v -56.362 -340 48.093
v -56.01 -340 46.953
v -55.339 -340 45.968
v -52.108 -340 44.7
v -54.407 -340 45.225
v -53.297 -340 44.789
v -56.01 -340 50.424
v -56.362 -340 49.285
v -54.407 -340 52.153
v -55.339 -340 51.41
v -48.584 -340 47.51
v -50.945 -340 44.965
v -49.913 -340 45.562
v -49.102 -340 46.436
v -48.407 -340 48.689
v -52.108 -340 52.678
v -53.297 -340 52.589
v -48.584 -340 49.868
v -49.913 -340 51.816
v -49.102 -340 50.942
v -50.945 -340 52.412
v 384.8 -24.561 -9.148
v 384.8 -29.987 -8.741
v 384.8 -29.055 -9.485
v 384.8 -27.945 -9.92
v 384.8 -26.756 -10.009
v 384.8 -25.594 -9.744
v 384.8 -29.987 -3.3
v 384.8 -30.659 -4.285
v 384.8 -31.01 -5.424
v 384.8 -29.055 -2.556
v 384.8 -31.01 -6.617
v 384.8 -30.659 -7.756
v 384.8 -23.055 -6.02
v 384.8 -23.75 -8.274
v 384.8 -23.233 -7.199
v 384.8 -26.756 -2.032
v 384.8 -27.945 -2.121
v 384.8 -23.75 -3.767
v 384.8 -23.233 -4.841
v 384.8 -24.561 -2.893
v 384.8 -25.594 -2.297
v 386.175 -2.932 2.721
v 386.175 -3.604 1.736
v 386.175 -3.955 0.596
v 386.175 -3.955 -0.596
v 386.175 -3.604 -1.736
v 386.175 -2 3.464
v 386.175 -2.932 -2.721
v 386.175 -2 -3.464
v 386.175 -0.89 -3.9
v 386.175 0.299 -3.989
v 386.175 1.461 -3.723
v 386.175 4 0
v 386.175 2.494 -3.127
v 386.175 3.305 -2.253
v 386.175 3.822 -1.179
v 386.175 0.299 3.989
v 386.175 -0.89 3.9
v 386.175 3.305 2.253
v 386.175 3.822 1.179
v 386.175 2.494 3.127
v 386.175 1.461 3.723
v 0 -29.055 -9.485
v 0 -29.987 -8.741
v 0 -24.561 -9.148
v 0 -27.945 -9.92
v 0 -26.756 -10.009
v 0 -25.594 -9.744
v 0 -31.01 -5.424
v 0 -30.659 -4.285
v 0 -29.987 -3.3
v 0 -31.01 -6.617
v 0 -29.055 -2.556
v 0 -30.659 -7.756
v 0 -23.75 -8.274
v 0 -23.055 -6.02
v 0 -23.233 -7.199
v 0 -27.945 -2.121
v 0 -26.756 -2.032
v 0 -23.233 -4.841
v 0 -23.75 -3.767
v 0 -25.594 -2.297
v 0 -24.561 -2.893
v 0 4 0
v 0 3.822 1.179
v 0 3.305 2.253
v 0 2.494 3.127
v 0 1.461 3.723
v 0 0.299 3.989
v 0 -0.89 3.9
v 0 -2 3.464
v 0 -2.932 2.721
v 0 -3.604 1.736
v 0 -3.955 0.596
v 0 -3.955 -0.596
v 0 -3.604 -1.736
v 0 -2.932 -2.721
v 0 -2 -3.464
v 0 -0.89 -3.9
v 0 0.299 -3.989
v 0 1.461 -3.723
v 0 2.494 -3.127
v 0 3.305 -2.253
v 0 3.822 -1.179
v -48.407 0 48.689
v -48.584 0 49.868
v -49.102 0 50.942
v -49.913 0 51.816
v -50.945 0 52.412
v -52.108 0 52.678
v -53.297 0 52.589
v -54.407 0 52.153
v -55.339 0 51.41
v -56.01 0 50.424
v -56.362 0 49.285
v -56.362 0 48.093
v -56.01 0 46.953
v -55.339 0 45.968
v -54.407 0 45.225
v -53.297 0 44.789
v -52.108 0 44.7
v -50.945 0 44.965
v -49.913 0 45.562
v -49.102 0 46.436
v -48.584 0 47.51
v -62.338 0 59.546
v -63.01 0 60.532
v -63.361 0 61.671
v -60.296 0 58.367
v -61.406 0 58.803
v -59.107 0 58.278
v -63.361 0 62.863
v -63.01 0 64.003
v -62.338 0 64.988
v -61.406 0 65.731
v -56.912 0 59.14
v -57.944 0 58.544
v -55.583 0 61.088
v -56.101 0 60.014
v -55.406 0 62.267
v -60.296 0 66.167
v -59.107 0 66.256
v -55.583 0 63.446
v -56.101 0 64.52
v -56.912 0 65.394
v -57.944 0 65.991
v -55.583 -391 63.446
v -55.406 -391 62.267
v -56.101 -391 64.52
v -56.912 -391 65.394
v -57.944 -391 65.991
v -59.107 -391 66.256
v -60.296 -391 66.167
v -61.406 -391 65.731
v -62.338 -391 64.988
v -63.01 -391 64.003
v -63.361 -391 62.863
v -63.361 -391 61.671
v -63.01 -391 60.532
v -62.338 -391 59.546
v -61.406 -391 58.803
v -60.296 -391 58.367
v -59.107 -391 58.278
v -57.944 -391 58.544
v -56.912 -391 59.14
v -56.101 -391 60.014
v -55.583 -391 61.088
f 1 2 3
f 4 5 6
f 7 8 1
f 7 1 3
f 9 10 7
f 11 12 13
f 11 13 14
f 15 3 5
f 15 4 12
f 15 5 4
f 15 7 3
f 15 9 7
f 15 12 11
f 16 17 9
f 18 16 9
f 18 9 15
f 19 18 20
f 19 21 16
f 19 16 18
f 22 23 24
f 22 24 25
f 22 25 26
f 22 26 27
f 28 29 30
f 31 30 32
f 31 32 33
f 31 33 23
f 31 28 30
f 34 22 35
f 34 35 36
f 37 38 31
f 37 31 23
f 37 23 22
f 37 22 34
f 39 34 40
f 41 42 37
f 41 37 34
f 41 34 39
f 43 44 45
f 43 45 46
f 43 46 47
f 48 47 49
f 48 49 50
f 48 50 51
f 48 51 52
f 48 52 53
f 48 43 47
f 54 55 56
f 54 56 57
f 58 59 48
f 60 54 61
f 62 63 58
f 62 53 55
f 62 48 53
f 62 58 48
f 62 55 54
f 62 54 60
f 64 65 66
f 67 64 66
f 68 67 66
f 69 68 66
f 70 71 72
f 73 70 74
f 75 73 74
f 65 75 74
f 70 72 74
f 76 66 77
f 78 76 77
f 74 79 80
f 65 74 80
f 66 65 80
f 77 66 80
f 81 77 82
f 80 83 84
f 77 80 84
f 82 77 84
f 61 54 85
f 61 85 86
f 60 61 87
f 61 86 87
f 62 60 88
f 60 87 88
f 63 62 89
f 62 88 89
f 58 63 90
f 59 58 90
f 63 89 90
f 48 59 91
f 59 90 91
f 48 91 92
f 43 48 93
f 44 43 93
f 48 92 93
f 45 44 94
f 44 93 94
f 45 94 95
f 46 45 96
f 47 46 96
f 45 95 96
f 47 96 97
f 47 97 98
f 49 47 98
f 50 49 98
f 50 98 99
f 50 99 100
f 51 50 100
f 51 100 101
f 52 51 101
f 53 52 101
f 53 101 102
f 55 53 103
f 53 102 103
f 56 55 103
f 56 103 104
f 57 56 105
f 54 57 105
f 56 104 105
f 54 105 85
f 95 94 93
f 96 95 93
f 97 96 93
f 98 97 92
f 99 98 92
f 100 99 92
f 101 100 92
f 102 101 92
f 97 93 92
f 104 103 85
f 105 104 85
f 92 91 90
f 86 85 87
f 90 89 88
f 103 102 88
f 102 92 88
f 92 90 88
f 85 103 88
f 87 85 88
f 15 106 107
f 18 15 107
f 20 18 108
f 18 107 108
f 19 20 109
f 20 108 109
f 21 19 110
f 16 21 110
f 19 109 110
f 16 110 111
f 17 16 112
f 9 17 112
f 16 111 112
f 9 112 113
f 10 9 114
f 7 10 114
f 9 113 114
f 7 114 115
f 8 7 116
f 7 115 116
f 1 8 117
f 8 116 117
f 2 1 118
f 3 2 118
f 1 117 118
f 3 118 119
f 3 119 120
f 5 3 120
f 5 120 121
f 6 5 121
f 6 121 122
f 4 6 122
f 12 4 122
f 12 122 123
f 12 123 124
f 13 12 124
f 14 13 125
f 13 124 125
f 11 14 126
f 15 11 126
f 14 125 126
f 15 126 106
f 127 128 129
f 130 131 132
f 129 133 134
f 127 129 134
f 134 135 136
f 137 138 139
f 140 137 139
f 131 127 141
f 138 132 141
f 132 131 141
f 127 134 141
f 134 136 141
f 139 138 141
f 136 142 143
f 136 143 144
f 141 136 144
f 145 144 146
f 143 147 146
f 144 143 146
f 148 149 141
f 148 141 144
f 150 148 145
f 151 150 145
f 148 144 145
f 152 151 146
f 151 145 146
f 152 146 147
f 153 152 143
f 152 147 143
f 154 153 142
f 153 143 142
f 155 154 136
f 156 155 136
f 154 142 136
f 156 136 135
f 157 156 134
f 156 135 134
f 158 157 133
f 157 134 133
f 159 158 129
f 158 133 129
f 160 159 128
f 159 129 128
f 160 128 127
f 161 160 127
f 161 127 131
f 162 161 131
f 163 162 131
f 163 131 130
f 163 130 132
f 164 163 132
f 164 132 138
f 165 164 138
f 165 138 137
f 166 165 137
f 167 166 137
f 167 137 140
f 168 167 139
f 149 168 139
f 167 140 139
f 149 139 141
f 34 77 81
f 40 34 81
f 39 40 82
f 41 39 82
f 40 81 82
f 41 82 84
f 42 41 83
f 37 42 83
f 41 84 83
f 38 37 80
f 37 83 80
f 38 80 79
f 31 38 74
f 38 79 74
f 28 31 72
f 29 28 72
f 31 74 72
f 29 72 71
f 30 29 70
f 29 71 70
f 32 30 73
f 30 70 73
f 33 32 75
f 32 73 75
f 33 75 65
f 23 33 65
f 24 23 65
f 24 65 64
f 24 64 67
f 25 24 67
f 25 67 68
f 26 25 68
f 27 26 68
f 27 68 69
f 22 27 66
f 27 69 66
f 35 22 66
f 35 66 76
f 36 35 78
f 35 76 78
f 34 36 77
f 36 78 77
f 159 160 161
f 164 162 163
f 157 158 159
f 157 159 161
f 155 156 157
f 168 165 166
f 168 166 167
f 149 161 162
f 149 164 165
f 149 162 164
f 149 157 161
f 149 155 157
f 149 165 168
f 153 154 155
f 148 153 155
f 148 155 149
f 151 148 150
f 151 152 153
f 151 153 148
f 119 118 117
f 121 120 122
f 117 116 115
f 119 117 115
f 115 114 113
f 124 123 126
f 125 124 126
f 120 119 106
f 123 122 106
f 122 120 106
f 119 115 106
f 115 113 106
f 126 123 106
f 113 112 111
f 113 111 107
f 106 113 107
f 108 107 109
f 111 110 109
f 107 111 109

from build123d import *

# Parameters (mm, degrees)
F2_R     = 4
F5_DEPTH = 386.175
F3_R     = 4
F6_DEPTH = 391
F7_R     = 4
F8_DEPTH = 340
F4_R     = 4
F9_DEPTH = 384.8


with BuildPart() as f5:
    # F2 (on Right) → F5 (new body)
    with BuildSketch(Plane.YZ):
        Circle(F2_R)
    extrude(amount=F5_DEPTH)


with BuildPart() as f6:
    # F3 (on Front) → F6 (new body)
    with BuildSketch(Plane.XZ):
        with Locations((-59.4056621194, 62.2670501471)):
            Circle(F3_R)
    extrude(amount=F6_DEPTH)


with BuildPart() as f8:
    # F7 (on Front) → F8 (new body)
    with BuildSketch(Plane.XZ):
        with Locations((-52.4065308273, 48.6889071763)):
            Circle(F7_R)
    extrude(amount=F8_DEPTH)


with BuildPart() as f9:
    # F4 (on Right) → F9 (new body)
    with BuildSketch(Plane.YZ):
        with Locations((-27.0550493151, -6.0204425827)):
            Circle(F4_R)
    extrude(amount=F9_DEPTH)


solid = Compound([f5.part, f6.part, f8.part, f9.part])
